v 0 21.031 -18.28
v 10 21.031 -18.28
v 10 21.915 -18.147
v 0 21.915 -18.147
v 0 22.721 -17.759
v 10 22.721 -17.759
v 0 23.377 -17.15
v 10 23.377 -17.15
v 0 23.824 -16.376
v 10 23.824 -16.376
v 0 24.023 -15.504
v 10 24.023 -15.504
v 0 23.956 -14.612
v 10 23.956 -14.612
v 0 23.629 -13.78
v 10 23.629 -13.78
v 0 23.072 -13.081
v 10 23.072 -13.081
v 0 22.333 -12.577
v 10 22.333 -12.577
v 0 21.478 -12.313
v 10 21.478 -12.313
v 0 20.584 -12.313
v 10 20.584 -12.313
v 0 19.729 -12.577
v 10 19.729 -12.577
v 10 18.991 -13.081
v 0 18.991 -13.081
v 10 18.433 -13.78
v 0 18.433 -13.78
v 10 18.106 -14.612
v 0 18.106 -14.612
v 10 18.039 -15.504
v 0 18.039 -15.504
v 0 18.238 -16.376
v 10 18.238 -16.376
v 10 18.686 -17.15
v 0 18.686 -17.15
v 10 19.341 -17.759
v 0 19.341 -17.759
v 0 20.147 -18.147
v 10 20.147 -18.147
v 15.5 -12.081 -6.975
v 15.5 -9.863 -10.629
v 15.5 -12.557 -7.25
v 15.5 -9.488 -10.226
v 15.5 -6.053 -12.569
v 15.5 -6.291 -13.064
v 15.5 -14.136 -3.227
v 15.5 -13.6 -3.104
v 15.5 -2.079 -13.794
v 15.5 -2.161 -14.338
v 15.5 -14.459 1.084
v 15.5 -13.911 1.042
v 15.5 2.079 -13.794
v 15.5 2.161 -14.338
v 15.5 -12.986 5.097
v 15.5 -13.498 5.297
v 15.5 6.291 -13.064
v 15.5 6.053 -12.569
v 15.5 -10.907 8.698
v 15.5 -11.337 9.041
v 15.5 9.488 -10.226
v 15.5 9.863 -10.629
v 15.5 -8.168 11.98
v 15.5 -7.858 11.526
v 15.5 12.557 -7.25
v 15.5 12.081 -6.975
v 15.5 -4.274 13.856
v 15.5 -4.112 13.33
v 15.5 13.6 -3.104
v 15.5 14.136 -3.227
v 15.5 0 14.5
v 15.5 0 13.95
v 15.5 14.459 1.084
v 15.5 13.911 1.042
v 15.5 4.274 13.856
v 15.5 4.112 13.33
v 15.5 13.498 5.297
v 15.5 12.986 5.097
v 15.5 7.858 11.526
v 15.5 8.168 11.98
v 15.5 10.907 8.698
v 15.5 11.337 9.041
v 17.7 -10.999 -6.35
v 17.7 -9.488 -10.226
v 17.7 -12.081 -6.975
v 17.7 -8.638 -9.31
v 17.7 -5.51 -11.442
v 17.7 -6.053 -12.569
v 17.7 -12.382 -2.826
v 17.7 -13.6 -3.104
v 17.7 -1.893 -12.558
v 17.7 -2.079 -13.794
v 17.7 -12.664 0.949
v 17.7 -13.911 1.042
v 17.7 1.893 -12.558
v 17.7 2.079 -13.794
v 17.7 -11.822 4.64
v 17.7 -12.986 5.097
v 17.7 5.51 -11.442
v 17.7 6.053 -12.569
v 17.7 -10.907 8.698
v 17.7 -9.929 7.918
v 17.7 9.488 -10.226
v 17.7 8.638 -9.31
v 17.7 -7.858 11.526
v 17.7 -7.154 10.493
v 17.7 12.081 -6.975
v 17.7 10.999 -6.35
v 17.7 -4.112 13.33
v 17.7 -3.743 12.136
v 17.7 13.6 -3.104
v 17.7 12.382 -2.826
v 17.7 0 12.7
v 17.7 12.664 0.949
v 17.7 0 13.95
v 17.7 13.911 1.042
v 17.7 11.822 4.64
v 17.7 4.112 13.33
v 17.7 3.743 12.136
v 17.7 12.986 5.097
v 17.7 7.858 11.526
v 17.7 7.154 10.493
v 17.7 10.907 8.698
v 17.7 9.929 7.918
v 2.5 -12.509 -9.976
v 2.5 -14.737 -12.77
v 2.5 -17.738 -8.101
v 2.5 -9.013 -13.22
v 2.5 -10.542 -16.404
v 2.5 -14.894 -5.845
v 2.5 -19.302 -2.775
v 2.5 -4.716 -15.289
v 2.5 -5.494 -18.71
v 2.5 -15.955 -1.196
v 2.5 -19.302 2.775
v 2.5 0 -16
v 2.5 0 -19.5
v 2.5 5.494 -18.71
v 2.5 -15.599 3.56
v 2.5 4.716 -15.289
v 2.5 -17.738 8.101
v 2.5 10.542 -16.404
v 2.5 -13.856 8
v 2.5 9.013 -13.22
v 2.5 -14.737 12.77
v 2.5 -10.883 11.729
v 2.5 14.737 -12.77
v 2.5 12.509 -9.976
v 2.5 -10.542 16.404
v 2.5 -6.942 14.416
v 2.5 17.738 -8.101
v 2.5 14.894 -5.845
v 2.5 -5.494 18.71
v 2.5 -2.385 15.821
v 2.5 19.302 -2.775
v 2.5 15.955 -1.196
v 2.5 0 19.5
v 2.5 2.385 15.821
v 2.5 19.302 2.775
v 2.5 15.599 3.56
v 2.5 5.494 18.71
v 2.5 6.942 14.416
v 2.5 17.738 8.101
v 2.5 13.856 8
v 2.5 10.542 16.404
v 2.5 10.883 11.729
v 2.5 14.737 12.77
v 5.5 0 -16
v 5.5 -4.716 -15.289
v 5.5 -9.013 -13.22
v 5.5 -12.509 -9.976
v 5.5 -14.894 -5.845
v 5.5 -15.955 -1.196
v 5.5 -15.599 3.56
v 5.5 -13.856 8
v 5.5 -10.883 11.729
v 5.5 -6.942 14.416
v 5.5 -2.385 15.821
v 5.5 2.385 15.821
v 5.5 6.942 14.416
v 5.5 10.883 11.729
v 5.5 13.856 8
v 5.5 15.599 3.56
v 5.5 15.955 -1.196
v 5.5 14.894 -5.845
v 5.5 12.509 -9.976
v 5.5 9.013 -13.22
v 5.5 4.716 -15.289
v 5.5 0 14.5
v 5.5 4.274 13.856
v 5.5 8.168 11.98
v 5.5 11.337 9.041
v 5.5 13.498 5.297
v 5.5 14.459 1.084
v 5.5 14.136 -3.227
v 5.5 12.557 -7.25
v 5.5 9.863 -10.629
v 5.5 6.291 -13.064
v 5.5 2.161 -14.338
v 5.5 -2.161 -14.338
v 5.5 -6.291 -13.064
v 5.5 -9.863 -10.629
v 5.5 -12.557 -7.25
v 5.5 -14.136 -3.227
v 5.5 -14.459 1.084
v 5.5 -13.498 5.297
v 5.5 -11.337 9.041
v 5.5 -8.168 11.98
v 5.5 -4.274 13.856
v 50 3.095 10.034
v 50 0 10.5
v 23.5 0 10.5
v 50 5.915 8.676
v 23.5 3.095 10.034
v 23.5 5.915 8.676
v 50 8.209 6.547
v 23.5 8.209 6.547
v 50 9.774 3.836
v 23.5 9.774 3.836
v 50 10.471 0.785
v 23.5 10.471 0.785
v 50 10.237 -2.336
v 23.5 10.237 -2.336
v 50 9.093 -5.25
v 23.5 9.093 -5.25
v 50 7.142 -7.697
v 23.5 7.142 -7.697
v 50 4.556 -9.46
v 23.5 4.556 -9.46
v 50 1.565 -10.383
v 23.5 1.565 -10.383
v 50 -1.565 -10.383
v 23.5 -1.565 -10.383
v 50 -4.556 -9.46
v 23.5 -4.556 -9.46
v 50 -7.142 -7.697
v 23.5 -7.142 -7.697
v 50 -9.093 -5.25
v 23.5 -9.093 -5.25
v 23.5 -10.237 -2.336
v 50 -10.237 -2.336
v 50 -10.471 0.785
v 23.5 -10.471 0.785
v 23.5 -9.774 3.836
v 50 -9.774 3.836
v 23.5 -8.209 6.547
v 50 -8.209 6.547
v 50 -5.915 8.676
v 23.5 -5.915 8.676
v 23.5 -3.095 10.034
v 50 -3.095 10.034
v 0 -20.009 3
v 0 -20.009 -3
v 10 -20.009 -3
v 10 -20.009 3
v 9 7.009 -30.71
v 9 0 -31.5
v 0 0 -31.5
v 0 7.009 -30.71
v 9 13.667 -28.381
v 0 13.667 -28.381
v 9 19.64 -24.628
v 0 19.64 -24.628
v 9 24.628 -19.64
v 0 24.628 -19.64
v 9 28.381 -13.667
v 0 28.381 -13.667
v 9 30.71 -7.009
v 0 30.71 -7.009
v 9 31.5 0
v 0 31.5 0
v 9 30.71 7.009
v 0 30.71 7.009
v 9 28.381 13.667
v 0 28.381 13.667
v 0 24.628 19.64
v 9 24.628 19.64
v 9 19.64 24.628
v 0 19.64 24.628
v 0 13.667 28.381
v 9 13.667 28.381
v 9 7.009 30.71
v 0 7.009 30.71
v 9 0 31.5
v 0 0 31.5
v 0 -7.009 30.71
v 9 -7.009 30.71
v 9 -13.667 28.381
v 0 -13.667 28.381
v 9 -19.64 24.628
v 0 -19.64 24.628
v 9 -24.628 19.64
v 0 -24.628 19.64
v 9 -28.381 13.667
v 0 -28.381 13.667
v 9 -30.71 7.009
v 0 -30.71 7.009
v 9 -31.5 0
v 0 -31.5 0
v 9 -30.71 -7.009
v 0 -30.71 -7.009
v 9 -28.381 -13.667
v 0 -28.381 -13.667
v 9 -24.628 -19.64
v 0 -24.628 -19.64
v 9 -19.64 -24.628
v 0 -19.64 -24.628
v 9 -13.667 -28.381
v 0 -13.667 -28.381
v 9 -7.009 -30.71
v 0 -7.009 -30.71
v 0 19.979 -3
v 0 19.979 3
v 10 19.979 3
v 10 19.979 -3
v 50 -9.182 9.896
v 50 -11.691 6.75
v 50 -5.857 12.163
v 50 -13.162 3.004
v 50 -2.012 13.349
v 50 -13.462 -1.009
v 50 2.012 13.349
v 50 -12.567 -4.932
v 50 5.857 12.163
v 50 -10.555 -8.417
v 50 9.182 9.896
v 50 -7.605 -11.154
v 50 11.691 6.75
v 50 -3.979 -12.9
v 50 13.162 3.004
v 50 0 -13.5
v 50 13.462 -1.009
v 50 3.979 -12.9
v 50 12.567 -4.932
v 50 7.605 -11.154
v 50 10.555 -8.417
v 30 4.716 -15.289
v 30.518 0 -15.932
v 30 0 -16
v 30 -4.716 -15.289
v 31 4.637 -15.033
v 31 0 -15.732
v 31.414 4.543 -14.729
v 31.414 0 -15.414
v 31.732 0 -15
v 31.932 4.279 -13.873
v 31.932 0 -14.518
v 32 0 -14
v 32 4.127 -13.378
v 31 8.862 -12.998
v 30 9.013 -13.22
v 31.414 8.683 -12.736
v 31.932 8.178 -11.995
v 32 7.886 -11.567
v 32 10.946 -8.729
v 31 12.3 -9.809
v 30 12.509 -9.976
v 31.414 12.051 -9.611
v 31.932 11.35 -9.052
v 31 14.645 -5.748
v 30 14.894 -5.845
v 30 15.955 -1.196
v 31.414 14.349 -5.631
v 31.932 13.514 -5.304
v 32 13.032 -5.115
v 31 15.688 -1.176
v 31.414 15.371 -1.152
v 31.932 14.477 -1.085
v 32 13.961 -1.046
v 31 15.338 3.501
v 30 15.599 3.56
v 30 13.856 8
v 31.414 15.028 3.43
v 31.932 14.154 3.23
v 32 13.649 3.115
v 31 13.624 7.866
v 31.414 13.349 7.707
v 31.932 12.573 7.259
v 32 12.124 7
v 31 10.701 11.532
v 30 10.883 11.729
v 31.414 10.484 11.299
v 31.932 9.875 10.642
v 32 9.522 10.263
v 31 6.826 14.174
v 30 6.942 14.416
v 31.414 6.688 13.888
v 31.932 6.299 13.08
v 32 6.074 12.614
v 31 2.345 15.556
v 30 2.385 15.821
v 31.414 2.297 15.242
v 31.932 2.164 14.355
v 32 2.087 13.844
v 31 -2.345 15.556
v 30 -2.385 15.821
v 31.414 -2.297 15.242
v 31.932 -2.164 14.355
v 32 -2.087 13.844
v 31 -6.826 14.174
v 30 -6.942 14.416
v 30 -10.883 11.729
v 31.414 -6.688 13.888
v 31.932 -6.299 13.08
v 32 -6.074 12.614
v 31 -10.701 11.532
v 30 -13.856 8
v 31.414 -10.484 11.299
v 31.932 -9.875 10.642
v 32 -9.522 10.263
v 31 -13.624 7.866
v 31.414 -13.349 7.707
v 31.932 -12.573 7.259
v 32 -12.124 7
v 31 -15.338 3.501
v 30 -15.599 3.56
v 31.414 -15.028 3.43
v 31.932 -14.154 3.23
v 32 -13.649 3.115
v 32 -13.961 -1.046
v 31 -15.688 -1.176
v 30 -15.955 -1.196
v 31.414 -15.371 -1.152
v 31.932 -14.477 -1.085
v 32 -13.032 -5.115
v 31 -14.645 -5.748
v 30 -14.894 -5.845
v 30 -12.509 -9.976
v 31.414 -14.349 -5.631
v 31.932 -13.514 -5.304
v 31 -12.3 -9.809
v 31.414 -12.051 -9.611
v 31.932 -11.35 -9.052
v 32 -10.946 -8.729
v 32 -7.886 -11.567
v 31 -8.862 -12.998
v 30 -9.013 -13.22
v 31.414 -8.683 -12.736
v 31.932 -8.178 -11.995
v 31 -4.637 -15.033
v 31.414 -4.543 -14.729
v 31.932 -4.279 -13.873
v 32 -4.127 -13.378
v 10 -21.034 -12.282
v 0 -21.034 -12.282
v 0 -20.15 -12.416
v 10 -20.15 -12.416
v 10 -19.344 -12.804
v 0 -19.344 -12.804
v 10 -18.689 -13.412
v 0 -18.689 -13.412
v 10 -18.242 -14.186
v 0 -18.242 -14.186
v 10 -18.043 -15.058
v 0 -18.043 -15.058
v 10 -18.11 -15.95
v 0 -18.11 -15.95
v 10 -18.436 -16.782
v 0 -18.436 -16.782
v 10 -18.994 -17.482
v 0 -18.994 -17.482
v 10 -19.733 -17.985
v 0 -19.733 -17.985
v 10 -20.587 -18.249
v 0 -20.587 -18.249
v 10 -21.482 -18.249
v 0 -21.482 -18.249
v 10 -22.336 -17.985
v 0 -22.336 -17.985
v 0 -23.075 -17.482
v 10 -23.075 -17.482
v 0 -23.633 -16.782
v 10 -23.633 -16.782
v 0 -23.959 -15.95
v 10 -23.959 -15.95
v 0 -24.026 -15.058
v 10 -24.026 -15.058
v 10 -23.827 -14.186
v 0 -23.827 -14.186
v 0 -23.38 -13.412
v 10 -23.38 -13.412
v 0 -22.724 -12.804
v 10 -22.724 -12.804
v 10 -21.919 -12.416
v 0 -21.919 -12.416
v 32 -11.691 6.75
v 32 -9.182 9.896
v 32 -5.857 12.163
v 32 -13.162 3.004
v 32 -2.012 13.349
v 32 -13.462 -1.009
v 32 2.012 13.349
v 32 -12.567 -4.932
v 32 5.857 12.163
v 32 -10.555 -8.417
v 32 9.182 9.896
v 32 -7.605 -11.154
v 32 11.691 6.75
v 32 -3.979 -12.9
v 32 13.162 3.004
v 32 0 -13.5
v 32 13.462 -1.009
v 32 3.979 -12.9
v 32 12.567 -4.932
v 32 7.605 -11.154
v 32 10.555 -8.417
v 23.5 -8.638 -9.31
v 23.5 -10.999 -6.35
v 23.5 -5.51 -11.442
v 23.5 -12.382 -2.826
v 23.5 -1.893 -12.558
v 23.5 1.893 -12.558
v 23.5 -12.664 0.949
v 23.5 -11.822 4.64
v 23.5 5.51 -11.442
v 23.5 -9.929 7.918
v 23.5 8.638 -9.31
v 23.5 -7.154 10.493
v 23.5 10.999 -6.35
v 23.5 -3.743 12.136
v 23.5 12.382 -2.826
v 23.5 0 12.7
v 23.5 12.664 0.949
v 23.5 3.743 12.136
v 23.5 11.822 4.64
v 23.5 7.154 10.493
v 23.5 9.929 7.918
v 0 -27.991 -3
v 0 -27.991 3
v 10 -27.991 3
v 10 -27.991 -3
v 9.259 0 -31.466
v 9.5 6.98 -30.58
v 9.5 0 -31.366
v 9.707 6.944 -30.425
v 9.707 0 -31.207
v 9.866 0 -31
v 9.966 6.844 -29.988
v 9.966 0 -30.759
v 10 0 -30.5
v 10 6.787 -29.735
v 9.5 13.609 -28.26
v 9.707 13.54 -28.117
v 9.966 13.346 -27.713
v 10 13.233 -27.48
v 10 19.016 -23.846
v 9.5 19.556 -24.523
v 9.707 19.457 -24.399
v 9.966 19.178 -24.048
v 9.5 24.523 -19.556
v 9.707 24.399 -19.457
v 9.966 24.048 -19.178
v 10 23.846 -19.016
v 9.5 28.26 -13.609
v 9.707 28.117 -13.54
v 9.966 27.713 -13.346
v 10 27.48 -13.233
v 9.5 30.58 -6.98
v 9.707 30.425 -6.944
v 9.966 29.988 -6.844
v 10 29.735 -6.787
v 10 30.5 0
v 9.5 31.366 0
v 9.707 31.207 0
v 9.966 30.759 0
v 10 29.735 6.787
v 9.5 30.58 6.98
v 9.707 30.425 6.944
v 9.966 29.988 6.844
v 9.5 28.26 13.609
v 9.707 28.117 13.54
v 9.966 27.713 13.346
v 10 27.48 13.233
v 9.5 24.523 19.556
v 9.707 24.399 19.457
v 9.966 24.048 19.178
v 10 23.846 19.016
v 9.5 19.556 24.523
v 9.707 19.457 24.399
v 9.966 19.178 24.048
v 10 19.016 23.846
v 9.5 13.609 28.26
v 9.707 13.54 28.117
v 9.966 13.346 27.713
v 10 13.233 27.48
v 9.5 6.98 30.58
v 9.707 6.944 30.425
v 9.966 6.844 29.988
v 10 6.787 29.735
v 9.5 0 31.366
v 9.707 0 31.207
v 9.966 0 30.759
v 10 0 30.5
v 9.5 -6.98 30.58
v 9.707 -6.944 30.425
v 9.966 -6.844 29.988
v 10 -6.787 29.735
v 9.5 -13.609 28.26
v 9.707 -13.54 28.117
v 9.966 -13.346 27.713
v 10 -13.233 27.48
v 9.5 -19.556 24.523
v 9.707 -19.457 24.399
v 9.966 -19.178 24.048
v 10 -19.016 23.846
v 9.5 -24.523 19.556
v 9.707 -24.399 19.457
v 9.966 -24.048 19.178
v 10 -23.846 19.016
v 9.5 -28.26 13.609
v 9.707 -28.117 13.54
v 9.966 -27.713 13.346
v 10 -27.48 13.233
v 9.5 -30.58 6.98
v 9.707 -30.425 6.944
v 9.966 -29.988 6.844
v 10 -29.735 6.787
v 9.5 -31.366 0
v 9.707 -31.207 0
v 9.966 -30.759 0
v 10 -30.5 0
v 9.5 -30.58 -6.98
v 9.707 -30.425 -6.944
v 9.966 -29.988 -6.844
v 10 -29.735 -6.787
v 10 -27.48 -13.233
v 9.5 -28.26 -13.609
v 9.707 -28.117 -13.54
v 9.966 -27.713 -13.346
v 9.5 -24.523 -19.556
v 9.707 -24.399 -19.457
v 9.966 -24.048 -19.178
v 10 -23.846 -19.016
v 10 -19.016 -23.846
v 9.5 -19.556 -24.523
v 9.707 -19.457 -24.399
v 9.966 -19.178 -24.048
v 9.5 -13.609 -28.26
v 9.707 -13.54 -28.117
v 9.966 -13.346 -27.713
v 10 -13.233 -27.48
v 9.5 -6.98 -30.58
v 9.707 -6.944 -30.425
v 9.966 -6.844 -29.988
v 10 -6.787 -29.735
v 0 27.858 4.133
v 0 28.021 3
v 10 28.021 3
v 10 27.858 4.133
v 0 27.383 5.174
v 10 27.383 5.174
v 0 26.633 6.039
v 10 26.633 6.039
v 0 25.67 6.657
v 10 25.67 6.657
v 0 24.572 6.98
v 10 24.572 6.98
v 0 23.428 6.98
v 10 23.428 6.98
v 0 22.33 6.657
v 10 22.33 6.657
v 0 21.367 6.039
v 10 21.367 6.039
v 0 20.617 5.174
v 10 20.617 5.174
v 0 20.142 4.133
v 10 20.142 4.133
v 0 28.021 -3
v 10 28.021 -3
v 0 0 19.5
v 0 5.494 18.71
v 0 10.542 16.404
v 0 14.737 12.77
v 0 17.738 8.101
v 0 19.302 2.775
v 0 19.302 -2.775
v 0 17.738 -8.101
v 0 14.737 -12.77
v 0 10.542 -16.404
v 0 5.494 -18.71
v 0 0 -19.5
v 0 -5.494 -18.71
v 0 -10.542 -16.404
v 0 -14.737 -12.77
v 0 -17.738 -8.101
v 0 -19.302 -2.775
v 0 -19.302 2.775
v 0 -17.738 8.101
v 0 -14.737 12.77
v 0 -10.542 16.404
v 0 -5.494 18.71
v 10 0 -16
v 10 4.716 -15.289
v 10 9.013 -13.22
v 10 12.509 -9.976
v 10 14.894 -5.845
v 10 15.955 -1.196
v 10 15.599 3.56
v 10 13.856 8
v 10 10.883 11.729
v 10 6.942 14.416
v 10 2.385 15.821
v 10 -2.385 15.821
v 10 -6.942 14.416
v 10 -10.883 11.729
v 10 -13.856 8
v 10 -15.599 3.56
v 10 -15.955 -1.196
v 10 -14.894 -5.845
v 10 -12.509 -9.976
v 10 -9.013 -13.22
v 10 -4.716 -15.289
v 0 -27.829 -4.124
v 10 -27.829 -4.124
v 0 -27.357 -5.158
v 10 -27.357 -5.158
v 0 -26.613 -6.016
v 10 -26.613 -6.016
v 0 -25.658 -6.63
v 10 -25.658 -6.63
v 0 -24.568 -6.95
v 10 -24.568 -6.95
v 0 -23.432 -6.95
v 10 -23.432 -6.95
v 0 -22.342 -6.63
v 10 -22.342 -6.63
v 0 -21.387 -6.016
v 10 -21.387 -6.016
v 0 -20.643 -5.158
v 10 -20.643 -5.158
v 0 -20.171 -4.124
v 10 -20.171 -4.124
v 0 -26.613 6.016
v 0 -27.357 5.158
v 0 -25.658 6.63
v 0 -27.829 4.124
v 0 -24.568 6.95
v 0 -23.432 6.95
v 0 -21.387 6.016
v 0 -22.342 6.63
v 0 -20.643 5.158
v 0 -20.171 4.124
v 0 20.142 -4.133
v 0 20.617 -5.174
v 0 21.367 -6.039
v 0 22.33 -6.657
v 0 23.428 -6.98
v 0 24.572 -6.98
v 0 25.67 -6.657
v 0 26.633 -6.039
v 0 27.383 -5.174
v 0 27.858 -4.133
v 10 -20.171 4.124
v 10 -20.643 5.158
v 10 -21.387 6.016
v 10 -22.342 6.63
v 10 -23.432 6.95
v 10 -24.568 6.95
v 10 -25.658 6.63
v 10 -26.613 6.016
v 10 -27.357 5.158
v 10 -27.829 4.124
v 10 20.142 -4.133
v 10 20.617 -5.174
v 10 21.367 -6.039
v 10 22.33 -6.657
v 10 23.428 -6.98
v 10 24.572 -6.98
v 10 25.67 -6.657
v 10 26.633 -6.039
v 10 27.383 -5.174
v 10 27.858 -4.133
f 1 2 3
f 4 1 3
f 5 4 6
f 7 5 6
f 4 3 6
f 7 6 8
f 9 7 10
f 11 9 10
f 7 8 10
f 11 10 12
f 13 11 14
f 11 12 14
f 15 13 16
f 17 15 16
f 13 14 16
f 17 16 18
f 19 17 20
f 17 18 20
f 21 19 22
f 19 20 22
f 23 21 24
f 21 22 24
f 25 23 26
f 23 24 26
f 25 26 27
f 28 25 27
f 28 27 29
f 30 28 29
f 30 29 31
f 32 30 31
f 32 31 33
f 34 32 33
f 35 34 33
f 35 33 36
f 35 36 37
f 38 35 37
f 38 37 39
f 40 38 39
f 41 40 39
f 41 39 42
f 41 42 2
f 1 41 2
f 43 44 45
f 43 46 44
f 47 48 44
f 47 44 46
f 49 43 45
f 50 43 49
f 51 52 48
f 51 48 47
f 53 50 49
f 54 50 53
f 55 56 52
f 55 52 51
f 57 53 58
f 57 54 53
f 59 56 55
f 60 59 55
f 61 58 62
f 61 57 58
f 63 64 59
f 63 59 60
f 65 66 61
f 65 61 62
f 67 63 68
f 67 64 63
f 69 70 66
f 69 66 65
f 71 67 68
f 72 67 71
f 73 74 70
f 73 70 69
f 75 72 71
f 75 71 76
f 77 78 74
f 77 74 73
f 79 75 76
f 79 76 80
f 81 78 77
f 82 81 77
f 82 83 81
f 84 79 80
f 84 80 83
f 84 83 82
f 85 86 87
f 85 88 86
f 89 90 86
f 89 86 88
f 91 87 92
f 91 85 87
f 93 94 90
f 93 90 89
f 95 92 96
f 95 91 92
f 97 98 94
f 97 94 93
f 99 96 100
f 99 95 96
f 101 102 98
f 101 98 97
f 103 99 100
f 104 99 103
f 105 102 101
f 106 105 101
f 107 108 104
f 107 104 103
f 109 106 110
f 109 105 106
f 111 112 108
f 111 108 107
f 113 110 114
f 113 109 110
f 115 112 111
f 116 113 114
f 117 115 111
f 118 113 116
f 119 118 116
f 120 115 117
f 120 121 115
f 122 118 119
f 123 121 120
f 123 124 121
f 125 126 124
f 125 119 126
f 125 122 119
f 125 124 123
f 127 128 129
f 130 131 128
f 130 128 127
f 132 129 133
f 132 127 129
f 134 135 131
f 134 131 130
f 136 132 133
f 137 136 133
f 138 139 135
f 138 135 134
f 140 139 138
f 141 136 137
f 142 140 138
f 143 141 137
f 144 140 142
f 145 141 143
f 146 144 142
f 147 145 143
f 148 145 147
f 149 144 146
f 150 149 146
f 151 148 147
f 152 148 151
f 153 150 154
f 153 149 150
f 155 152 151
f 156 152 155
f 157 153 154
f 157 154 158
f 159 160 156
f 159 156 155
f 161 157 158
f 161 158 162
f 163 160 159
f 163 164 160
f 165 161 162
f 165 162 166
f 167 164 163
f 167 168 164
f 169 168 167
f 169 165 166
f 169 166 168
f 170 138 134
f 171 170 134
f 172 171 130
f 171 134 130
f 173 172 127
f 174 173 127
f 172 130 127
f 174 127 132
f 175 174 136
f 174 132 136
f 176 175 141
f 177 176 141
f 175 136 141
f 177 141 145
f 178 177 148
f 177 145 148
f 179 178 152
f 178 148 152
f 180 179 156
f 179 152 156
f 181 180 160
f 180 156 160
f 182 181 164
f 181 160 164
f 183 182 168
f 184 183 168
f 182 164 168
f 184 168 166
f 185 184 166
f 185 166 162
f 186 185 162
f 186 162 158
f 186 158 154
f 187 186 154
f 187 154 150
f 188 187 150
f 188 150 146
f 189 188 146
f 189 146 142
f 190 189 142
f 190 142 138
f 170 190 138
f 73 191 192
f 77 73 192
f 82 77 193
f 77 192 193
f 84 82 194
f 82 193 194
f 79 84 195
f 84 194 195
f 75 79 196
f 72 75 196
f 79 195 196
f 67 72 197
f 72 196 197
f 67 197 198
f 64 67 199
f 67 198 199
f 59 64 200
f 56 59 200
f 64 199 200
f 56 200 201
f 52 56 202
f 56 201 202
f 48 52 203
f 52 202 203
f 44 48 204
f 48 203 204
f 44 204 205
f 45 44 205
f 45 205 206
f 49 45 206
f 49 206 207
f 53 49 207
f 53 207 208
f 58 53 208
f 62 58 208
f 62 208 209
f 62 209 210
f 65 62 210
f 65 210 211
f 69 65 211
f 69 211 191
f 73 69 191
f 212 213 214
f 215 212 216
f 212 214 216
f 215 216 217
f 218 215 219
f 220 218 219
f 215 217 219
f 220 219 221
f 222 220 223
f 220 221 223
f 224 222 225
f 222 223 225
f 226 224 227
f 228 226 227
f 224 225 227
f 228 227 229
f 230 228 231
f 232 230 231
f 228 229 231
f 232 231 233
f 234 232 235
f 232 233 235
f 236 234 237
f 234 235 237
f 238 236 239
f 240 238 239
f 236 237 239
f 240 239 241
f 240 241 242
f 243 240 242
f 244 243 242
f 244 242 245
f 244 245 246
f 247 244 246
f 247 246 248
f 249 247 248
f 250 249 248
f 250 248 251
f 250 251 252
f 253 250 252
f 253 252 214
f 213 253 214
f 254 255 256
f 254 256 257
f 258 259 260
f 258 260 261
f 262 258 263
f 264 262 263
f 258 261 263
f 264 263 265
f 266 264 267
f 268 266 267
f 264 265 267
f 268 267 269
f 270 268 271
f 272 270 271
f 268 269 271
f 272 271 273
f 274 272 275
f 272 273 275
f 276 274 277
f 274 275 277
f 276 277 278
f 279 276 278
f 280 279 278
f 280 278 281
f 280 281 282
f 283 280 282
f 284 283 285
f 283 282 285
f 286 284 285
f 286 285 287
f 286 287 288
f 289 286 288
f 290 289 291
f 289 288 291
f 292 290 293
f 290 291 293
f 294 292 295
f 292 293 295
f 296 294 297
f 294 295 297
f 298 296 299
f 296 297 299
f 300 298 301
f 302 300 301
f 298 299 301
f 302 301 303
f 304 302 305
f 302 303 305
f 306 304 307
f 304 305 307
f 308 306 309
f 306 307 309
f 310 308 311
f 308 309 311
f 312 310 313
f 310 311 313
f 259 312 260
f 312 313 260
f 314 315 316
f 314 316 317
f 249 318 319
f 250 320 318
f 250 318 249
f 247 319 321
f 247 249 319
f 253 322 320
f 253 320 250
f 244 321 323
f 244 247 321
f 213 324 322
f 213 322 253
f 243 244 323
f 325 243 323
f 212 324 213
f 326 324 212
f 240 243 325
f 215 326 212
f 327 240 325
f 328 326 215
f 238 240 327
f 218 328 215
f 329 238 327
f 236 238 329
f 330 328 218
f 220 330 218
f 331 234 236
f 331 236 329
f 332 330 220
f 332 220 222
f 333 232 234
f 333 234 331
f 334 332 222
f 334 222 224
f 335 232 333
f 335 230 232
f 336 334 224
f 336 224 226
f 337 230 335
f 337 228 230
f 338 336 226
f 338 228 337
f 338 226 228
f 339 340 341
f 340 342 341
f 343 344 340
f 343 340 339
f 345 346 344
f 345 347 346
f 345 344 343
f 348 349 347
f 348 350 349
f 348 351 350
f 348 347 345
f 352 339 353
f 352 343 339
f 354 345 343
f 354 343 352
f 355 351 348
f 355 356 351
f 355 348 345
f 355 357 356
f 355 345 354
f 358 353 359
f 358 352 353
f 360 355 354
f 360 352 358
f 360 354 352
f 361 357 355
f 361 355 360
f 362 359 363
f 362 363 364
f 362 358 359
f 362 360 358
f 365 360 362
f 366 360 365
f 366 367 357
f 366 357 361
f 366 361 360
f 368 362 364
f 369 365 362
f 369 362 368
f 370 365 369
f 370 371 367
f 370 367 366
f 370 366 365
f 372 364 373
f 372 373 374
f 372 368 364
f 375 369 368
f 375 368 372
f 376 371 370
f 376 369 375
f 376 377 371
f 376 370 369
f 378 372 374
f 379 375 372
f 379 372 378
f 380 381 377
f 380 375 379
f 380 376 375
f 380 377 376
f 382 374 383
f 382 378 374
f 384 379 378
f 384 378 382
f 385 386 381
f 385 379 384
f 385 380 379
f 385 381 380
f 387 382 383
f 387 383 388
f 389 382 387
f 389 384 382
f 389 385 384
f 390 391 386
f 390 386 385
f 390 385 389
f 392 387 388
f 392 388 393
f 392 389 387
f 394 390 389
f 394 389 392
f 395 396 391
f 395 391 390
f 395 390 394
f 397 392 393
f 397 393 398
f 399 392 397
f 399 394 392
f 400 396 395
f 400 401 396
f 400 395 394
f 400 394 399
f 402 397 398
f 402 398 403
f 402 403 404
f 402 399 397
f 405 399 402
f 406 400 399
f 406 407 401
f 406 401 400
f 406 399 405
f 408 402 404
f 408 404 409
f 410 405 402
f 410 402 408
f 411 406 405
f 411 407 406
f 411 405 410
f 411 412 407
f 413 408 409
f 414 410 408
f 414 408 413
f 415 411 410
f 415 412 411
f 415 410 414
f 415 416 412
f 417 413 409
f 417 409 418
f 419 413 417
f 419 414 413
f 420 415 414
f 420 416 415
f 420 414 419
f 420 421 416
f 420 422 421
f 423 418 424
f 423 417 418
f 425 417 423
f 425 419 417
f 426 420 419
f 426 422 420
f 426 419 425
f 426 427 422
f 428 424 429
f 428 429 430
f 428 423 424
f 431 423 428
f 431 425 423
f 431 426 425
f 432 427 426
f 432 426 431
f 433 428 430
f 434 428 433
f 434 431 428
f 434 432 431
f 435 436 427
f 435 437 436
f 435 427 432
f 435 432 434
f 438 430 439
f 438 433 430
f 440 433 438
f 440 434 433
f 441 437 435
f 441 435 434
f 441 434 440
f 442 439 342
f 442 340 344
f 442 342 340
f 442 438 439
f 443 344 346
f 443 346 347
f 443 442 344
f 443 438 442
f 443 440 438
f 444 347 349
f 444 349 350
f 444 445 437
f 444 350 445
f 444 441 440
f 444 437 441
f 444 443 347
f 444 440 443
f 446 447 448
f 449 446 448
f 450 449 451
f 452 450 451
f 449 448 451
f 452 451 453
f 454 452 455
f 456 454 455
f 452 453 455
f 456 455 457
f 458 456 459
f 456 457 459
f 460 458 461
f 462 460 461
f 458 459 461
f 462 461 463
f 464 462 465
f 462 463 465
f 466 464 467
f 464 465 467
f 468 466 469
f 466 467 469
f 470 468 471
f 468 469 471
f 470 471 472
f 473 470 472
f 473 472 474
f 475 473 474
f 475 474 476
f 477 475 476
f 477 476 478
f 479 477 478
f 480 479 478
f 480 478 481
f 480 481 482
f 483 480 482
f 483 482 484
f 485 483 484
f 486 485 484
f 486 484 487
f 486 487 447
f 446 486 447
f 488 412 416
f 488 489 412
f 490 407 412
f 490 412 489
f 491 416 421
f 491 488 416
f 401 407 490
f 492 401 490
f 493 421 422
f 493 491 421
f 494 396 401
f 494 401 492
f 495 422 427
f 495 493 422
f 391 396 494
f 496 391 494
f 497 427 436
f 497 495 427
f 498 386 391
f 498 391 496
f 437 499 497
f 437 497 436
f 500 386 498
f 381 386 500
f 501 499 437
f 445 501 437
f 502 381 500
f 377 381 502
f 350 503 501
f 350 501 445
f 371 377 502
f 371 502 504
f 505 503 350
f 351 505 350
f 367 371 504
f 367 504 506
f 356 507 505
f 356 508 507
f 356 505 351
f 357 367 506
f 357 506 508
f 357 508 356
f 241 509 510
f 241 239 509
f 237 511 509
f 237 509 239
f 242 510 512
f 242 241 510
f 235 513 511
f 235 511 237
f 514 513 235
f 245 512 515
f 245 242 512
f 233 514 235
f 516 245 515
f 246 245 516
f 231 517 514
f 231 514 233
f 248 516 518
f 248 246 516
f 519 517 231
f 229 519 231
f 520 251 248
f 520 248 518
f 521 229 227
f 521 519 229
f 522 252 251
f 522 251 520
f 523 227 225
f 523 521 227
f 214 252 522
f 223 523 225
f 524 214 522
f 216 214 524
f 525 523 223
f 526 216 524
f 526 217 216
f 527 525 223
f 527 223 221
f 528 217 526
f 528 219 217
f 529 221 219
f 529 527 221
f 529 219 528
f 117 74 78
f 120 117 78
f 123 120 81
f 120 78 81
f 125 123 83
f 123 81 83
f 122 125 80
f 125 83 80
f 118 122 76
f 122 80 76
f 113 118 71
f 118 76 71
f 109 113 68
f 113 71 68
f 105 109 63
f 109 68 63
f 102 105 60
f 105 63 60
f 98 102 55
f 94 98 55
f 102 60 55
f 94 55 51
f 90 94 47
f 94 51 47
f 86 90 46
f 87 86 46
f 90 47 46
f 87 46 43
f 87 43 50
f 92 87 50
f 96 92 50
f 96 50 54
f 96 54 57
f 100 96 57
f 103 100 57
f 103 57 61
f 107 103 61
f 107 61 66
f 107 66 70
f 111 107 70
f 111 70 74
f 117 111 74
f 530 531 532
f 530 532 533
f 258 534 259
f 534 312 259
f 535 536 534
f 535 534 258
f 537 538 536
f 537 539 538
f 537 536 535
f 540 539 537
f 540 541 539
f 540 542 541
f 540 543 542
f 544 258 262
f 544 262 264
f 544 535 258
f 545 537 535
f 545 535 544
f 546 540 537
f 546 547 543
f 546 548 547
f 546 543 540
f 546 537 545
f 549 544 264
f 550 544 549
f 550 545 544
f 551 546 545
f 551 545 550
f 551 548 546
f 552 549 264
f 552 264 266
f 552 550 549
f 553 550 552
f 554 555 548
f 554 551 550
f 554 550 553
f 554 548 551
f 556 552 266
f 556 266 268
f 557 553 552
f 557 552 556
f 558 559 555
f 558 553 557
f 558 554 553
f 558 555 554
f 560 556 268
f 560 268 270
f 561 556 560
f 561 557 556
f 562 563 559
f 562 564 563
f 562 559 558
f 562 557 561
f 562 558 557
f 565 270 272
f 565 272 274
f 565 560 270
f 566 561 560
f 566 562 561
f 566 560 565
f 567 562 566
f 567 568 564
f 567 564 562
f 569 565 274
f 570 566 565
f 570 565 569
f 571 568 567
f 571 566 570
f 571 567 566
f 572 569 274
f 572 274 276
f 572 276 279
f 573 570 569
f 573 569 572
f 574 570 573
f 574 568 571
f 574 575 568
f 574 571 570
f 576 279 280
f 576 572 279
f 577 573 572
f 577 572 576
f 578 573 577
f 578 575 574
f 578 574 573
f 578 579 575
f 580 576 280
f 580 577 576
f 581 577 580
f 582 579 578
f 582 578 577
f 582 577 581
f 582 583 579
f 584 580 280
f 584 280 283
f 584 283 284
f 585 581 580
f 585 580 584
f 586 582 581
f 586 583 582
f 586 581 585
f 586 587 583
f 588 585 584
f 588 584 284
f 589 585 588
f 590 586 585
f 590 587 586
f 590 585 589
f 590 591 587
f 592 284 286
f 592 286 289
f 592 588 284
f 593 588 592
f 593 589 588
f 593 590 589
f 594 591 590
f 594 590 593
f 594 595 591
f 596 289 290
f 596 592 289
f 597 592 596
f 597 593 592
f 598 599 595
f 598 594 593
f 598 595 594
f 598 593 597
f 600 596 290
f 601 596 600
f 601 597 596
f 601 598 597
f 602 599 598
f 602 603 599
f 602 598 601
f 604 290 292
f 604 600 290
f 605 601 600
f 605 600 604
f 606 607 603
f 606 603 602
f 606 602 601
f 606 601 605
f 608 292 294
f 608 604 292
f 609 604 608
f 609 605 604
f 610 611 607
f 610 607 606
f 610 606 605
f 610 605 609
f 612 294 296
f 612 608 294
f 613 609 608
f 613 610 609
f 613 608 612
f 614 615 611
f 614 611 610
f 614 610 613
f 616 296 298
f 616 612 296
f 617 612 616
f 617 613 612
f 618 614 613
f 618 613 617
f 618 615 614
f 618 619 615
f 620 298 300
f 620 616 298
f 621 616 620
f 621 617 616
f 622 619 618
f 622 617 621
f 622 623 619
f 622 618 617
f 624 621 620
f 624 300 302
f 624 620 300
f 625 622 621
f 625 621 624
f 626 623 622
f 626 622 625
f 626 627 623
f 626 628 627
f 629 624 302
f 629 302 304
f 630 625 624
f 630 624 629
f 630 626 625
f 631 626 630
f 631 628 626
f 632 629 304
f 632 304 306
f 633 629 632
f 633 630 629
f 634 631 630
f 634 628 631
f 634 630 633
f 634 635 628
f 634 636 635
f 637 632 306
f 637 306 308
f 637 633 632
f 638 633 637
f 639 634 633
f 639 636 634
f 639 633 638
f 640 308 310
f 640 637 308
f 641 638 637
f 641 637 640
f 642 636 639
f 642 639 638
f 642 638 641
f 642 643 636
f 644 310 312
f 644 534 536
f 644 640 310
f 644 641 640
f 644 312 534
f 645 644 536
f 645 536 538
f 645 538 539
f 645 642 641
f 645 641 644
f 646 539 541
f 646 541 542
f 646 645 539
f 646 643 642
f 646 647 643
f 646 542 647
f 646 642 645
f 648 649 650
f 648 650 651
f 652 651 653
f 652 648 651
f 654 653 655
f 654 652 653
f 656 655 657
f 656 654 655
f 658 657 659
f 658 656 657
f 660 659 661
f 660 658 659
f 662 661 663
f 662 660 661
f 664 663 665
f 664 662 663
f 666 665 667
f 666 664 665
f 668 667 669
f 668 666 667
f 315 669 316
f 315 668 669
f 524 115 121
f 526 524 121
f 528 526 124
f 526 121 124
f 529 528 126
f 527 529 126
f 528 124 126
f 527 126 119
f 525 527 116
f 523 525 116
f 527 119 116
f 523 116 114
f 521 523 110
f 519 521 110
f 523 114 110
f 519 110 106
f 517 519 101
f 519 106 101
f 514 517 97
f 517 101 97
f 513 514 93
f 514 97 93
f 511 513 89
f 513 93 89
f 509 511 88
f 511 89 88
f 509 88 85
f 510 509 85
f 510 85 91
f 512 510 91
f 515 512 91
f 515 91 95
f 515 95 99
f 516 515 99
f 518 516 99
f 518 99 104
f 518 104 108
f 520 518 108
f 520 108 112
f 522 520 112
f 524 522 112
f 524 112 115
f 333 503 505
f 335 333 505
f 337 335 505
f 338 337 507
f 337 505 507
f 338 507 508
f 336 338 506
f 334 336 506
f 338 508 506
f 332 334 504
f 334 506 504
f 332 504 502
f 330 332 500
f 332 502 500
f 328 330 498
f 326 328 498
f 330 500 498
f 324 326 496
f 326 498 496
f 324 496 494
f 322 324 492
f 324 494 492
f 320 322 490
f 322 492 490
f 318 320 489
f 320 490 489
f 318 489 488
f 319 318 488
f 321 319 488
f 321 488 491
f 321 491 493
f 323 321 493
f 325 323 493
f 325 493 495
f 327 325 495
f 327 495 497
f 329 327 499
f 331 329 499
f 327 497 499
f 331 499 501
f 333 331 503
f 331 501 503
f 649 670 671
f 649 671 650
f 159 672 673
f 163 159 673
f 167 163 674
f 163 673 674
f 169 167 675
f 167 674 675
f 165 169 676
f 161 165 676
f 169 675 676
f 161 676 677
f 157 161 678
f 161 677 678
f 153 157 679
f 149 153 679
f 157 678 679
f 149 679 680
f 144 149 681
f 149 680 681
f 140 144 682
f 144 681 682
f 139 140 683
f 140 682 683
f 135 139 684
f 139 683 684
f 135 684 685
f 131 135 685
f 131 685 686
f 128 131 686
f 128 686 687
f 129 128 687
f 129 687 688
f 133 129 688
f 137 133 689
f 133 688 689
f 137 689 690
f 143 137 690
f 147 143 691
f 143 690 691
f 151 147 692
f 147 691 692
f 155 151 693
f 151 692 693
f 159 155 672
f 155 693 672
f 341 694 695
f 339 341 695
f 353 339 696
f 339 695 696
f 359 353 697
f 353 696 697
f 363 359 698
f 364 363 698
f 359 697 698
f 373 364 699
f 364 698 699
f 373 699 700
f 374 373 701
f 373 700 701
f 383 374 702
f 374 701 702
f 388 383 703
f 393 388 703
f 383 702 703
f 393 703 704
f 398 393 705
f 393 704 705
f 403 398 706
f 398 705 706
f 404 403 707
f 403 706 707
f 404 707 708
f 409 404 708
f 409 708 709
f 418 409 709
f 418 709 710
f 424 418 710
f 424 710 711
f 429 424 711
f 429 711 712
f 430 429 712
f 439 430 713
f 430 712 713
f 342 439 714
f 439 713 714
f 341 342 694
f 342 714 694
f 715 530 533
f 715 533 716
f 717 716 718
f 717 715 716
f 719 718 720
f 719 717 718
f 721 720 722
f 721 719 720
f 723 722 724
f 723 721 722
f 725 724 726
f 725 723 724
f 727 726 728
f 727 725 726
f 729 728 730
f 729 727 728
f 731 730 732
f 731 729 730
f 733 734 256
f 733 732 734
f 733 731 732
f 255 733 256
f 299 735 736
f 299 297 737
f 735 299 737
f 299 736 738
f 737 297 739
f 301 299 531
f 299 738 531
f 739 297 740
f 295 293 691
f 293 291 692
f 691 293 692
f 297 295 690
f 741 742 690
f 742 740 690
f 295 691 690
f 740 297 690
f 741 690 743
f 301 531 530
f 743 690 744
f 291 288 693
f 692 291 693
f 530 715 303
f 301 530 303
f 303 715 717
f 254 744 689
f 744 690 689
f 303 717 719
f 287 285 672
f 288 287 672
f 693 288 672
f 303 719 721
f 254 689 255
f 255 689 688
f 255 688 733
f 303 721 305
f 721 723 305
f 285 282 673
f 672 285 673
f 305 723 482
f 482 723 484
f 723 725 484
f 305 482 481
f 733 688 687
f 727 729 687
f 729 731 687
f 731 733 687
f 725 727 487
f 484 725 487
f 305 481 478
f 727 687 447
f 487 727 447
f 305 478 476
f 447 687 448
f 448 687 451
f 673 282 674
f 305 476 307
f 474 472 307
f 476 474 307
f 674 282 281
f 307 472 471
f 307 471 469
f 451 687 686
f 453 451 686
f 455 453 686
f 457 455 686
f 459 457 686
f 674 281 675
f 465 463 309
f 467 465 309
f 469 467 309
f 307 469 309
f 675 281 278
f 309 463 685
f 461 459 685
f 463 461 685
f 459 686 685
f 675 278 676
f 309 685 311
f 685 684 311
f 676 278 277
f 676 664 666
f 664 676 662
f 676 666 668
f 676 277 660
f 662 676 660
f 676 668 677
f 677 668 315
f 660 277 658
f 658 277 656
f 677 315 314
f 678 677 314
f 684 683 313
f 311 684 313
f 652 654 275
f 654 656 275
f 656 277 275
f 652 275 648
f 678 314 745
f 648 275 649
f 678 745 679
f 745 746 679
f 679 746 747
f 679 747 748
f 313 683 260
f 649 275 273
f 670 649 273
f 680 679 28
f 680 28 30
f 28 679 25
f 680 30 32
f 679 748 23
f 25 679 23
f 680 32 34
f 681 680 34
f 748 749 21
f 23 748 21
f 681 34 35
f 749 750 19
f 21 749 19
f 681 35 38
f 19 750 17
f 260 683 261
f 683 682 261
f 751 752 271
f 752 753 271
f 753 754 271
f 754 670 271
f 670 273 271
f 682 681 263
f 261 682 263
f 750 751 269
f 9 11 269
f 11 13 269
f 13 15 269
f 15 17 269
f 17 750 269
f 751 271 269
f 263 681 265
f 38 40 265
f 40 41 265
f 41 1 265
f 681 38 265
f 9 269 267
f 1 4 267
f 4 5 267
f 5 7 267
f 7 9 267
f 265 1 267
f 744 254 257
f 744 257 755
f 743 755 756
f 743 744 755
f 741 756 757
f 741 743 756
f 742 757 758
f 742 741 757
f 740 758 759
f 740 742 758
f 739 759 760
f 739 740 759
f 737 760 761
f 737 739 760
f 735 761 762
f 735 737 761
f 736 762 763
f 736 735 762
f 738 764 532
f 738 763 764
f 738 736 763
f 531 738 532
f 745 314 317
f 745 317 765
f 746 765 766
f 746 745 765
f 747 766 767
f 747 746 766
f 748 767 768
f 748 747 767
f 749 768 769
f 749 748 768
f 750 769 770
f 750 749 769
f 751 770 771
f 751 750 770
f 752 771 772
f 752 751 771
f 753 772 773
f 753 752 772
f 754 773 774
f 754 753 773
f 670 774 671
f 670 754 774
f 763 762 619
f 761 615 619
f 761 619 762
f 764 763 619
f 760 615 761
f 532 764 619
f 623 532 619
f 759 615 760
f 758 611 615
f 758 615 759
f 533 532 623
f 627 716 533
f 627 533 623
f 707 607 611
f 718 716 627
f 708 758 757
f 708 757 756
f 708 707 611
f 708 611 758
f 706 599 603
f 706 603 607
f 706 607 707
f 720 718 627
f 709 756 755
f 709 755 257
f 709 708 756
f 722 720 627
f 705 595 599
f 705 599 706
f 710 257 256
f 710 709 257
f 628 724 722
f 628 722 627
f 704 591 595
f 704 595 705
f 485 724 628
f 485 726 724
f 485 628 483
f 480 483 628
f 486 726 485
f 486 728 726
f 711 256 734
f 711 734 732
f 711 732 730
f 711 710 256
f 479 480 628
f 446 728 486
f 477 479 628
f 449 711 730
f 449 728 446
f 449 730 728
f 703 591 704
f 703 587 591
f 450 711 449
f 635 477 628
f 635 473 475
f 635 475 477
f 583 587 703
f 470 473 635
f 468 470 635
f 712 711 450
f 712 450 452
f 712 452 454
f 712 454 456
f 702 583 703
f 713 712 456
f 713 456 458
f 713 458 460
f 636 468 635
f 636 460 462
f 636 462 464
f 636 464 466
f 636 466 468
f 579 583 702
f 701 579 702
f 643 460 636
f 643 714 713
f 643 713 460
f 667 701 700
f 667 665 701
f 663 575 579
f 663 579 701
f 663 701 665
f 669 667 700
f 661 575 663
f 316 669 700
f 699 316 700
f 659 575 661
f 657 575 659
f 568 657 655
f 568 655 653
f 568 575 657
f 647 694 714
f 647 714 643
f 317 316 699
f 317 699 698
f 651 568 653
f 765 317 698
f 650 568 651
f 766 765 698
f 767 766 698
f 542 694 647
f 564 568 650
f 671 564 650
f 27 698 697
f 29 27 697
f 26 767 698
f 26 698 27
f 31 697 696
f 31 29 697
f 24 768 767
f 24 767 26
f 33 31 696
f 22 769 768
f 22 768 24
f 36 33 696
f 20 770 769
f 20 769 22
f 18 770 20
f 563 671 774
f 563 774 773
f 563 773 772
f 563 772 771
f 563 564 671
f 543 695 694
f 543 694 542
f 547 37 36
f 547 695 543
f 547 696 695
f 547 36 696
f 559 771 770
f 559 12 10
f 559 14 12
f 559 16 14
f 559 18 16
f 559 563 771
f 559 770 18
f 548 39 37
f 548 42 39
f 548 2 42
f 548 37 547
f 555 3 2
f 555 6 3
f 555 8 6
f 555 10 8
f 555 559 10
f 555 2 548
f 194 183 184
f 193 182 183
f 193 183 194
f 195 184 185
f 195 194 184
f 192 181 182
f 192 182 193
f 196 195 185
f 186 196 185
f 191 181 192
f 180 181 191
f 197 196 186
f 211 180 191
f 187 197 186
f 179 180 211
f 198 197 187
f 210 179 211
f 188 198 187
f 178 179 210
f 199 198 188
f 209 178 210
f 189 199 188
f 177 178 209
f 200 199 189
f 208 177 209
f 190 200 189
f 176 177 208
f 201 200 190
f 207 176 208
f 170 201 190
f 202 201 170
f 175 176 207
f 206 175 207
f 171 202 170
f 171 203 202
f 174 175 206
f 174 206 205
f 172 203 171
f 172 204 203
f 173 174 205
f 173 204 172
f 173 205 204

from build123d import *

# Parameters (mm, degrees)
SKETCH1_R           = 31.5
BOSS_EXTRUDE1_DEPTH = 10
SKETCH2_R           = 16
BOSS_EXTRUDE2_DEPTH = 22
SKETCH3_R           = 13.5
BOSS_EXTRUDE3_DEPTH = 18
FILLET1_R           = 1
FILLET6_R           = 2
SKETCH4_R           = 10.5
CUT_EXTRUDE1_DEPTH  = 150
SKETCH5_R           = 12.7
CUT_EXTRUDE2_DEPTH  = 23.5
SKETCH6_R           = 13.95
CUT_EXTRUDE3_DEPTH  = 17.7
SKETCH7_R           = 14.5
CUT_EXTRUDE4_DEPTH  = 15.5
SKETCH8_R           = 16
CUT_EXTRUDE5_DEPTH  = 5.5
SKETCH9_R           = 19.5
CUT_EXTRUDE6_DEPTH  = 2.5
SKETCH10_R          = 3
CUT_EXTRUDE11_DEPTH = 20
SKETCH11_R          = 3
CUT_EXTRUDE12_DEPTH = 20
CUT_EXTRUDE16_DEPTH = 20
CUT_EXTRUDE17_DEPTH = 20


with BuildPart() as part:
    # Sketch1 → Boss-Extrude1 (new body)
    with BuildSketch(Plane(origin=(0, 0, 0), x_dir=(0, 0, -1), z_dir=(1, 0, 0))):
        Circle(SKETCH1_R)
    extrude(amount=BOSS_EXTRUDE1_DEPTH)

    # Sketch2 → Boss-Extrude2 (add)
    with BuildSketch(Plane(origin=(10, 0, 0), x_dir=(0, 0, -1), z_dir=(1, 0, 0))):
        Circle(SKETCH2_R)
    extrude(amount=BOSS_EXTRUDE2_DEPTH)

    # Sketch3 → Boss-Extrude3 (add)
    with BuildSketch(Plane(origin=(32, 0, 0), x_dir=(0, 0, -1), z_dir=(1, 0, 0))):
        Circle(SKETCH3_R)
    extrude(amount=BOSS_EXTRUDE3_DEPTH)

    # Fillet1
    fillet1_edges = [part.edges().sort_by_distance(p)[0] for p in [
        (10, 0, 31.5),
    ]]
    fillet(fillet1_edges, radius=FILLET1_R)

    # Fillet6
    fillet6_edges = [part.edges().sort_by_distance(p)[0] for p in [
        (32, 0, 16),
    ]]
    fillet(fillet6_edges, radius=FILLET6_R)

    # Sketch4 → Cut-Extrude1 (cut)
    with BuildSketch(Plane.ZY):
        Circle(SKETCH4_R)
    extrude(amount=-CUT_EXTRUDE1_DEPTH, mode=Mode.SUBTRACT)

    # Sketch5 → Cut-Extrude2 (cut)
    with BuildSketch(Plane.ZY):
        Circle(SKETCH5_R)
    extrude(amount=-CUT_EXTRUDE2_DEPTH, mode=Mode.SUBTRACT)

    # Sketch6 → Cut-Extrude3 (cut)
    with BuildSketch(Plane.ZY):
        Circle(SKETCH6_R)
    extrude(amount=-CUT_EXTRUDE3_DEPTH, mode=Mode.SUBTRACT)

    # Sketch7 → Cut-Extrude4 (cut)
    with BuildSketch(Plane.ZY):
        Circle(SKETCH7_R)
    extrude(amount=-CUT_EXTRUDE4_DEPTH, mode=Mode.SUBTRACT)

    # Sketch8 → Cut-Extrude5 (cut)
    with BuildSketch(Plane.ZY):
        with Locations(Location((0, 0, 0), (0, 0, 180))):
            Circle(SKETCH8_R)
    extrude(amount=-CUT_EXTRUDE5_DEPTH, mode=Mode.SUBTRACT)

    # Sketch9 → Cut-Extrude6 (cut)
    with BuildSketch(Plane.ZY):
        Circle(SKETCH9_R)
    extrude(amount=-CUT_EXTRUDE6_DEPTH, mode=Mode.SUBTRACT)

    # Sketch10 → Cut-Extrude11 (cut)
    with BuildSketch(Plane(origin=(10, 0, 0), x_dir=(0, 0, -1), z_dir=(1, 0, 0))):
        with Locations((15.279966328, 21.0310694)):
            Circle(SKETCH10_R)
    extrude(amount=-CUT_EXTRUDE11_DEPTH, mode=Mode.SUBTRACT)

    # Sketch11 → Cut-Extrude12 (cut)
    with BuildSketch(Plane.ZY):
        with Locations((-15.28241656, -21.034441854)):
            Circle(SKETCH11_R)
    extrude(amount=-CUT_EXTRUDE12_DEPTH, mode=Mode.SUBTRACT)

    # Sketch12 → Cut-Extrude16 (cut)
    with BuildSketch(Plane.ZY):
        with BuildLine():
            Line((-3, -20.009180996), (3, -20.009180996))
            ThreePointArc((3, -20.009180996), (6.990819004, -24), (3, -27.990819004))
            Line((3, -27.990819004), (-3, -27.990819004))
            ThreePointArc((-3, -27.990819004), (-6.990819004, -24), (-3, -20.009180996))
        make_face()
    extrude(amount=-CUT_EXTRUDE16_DEPTH, mode=Mode.SUBTRACT)

    # Sketch14 → Cut-Extrude17 (cut)
    with BuildSketch(Plane.ZY):
        with BuildLine():
            Line((-3, 28.020849302), (3, 28.020849302))
            ThreePointArc((3, 28.020849302), (7.020849302, 24), (3, 19.979150698))
            Line((3, 19.979150698), (-3, 19.979150698))
            ThreePointArc((-3, 19.979150698), (-7.020849302, 24), (-3, 28.020849302))
        make_face()
    extrude(amount=-CUT_EXTRUDE17_DEPTH, mode=Mode.SUBTRACT)


solid = part.part
